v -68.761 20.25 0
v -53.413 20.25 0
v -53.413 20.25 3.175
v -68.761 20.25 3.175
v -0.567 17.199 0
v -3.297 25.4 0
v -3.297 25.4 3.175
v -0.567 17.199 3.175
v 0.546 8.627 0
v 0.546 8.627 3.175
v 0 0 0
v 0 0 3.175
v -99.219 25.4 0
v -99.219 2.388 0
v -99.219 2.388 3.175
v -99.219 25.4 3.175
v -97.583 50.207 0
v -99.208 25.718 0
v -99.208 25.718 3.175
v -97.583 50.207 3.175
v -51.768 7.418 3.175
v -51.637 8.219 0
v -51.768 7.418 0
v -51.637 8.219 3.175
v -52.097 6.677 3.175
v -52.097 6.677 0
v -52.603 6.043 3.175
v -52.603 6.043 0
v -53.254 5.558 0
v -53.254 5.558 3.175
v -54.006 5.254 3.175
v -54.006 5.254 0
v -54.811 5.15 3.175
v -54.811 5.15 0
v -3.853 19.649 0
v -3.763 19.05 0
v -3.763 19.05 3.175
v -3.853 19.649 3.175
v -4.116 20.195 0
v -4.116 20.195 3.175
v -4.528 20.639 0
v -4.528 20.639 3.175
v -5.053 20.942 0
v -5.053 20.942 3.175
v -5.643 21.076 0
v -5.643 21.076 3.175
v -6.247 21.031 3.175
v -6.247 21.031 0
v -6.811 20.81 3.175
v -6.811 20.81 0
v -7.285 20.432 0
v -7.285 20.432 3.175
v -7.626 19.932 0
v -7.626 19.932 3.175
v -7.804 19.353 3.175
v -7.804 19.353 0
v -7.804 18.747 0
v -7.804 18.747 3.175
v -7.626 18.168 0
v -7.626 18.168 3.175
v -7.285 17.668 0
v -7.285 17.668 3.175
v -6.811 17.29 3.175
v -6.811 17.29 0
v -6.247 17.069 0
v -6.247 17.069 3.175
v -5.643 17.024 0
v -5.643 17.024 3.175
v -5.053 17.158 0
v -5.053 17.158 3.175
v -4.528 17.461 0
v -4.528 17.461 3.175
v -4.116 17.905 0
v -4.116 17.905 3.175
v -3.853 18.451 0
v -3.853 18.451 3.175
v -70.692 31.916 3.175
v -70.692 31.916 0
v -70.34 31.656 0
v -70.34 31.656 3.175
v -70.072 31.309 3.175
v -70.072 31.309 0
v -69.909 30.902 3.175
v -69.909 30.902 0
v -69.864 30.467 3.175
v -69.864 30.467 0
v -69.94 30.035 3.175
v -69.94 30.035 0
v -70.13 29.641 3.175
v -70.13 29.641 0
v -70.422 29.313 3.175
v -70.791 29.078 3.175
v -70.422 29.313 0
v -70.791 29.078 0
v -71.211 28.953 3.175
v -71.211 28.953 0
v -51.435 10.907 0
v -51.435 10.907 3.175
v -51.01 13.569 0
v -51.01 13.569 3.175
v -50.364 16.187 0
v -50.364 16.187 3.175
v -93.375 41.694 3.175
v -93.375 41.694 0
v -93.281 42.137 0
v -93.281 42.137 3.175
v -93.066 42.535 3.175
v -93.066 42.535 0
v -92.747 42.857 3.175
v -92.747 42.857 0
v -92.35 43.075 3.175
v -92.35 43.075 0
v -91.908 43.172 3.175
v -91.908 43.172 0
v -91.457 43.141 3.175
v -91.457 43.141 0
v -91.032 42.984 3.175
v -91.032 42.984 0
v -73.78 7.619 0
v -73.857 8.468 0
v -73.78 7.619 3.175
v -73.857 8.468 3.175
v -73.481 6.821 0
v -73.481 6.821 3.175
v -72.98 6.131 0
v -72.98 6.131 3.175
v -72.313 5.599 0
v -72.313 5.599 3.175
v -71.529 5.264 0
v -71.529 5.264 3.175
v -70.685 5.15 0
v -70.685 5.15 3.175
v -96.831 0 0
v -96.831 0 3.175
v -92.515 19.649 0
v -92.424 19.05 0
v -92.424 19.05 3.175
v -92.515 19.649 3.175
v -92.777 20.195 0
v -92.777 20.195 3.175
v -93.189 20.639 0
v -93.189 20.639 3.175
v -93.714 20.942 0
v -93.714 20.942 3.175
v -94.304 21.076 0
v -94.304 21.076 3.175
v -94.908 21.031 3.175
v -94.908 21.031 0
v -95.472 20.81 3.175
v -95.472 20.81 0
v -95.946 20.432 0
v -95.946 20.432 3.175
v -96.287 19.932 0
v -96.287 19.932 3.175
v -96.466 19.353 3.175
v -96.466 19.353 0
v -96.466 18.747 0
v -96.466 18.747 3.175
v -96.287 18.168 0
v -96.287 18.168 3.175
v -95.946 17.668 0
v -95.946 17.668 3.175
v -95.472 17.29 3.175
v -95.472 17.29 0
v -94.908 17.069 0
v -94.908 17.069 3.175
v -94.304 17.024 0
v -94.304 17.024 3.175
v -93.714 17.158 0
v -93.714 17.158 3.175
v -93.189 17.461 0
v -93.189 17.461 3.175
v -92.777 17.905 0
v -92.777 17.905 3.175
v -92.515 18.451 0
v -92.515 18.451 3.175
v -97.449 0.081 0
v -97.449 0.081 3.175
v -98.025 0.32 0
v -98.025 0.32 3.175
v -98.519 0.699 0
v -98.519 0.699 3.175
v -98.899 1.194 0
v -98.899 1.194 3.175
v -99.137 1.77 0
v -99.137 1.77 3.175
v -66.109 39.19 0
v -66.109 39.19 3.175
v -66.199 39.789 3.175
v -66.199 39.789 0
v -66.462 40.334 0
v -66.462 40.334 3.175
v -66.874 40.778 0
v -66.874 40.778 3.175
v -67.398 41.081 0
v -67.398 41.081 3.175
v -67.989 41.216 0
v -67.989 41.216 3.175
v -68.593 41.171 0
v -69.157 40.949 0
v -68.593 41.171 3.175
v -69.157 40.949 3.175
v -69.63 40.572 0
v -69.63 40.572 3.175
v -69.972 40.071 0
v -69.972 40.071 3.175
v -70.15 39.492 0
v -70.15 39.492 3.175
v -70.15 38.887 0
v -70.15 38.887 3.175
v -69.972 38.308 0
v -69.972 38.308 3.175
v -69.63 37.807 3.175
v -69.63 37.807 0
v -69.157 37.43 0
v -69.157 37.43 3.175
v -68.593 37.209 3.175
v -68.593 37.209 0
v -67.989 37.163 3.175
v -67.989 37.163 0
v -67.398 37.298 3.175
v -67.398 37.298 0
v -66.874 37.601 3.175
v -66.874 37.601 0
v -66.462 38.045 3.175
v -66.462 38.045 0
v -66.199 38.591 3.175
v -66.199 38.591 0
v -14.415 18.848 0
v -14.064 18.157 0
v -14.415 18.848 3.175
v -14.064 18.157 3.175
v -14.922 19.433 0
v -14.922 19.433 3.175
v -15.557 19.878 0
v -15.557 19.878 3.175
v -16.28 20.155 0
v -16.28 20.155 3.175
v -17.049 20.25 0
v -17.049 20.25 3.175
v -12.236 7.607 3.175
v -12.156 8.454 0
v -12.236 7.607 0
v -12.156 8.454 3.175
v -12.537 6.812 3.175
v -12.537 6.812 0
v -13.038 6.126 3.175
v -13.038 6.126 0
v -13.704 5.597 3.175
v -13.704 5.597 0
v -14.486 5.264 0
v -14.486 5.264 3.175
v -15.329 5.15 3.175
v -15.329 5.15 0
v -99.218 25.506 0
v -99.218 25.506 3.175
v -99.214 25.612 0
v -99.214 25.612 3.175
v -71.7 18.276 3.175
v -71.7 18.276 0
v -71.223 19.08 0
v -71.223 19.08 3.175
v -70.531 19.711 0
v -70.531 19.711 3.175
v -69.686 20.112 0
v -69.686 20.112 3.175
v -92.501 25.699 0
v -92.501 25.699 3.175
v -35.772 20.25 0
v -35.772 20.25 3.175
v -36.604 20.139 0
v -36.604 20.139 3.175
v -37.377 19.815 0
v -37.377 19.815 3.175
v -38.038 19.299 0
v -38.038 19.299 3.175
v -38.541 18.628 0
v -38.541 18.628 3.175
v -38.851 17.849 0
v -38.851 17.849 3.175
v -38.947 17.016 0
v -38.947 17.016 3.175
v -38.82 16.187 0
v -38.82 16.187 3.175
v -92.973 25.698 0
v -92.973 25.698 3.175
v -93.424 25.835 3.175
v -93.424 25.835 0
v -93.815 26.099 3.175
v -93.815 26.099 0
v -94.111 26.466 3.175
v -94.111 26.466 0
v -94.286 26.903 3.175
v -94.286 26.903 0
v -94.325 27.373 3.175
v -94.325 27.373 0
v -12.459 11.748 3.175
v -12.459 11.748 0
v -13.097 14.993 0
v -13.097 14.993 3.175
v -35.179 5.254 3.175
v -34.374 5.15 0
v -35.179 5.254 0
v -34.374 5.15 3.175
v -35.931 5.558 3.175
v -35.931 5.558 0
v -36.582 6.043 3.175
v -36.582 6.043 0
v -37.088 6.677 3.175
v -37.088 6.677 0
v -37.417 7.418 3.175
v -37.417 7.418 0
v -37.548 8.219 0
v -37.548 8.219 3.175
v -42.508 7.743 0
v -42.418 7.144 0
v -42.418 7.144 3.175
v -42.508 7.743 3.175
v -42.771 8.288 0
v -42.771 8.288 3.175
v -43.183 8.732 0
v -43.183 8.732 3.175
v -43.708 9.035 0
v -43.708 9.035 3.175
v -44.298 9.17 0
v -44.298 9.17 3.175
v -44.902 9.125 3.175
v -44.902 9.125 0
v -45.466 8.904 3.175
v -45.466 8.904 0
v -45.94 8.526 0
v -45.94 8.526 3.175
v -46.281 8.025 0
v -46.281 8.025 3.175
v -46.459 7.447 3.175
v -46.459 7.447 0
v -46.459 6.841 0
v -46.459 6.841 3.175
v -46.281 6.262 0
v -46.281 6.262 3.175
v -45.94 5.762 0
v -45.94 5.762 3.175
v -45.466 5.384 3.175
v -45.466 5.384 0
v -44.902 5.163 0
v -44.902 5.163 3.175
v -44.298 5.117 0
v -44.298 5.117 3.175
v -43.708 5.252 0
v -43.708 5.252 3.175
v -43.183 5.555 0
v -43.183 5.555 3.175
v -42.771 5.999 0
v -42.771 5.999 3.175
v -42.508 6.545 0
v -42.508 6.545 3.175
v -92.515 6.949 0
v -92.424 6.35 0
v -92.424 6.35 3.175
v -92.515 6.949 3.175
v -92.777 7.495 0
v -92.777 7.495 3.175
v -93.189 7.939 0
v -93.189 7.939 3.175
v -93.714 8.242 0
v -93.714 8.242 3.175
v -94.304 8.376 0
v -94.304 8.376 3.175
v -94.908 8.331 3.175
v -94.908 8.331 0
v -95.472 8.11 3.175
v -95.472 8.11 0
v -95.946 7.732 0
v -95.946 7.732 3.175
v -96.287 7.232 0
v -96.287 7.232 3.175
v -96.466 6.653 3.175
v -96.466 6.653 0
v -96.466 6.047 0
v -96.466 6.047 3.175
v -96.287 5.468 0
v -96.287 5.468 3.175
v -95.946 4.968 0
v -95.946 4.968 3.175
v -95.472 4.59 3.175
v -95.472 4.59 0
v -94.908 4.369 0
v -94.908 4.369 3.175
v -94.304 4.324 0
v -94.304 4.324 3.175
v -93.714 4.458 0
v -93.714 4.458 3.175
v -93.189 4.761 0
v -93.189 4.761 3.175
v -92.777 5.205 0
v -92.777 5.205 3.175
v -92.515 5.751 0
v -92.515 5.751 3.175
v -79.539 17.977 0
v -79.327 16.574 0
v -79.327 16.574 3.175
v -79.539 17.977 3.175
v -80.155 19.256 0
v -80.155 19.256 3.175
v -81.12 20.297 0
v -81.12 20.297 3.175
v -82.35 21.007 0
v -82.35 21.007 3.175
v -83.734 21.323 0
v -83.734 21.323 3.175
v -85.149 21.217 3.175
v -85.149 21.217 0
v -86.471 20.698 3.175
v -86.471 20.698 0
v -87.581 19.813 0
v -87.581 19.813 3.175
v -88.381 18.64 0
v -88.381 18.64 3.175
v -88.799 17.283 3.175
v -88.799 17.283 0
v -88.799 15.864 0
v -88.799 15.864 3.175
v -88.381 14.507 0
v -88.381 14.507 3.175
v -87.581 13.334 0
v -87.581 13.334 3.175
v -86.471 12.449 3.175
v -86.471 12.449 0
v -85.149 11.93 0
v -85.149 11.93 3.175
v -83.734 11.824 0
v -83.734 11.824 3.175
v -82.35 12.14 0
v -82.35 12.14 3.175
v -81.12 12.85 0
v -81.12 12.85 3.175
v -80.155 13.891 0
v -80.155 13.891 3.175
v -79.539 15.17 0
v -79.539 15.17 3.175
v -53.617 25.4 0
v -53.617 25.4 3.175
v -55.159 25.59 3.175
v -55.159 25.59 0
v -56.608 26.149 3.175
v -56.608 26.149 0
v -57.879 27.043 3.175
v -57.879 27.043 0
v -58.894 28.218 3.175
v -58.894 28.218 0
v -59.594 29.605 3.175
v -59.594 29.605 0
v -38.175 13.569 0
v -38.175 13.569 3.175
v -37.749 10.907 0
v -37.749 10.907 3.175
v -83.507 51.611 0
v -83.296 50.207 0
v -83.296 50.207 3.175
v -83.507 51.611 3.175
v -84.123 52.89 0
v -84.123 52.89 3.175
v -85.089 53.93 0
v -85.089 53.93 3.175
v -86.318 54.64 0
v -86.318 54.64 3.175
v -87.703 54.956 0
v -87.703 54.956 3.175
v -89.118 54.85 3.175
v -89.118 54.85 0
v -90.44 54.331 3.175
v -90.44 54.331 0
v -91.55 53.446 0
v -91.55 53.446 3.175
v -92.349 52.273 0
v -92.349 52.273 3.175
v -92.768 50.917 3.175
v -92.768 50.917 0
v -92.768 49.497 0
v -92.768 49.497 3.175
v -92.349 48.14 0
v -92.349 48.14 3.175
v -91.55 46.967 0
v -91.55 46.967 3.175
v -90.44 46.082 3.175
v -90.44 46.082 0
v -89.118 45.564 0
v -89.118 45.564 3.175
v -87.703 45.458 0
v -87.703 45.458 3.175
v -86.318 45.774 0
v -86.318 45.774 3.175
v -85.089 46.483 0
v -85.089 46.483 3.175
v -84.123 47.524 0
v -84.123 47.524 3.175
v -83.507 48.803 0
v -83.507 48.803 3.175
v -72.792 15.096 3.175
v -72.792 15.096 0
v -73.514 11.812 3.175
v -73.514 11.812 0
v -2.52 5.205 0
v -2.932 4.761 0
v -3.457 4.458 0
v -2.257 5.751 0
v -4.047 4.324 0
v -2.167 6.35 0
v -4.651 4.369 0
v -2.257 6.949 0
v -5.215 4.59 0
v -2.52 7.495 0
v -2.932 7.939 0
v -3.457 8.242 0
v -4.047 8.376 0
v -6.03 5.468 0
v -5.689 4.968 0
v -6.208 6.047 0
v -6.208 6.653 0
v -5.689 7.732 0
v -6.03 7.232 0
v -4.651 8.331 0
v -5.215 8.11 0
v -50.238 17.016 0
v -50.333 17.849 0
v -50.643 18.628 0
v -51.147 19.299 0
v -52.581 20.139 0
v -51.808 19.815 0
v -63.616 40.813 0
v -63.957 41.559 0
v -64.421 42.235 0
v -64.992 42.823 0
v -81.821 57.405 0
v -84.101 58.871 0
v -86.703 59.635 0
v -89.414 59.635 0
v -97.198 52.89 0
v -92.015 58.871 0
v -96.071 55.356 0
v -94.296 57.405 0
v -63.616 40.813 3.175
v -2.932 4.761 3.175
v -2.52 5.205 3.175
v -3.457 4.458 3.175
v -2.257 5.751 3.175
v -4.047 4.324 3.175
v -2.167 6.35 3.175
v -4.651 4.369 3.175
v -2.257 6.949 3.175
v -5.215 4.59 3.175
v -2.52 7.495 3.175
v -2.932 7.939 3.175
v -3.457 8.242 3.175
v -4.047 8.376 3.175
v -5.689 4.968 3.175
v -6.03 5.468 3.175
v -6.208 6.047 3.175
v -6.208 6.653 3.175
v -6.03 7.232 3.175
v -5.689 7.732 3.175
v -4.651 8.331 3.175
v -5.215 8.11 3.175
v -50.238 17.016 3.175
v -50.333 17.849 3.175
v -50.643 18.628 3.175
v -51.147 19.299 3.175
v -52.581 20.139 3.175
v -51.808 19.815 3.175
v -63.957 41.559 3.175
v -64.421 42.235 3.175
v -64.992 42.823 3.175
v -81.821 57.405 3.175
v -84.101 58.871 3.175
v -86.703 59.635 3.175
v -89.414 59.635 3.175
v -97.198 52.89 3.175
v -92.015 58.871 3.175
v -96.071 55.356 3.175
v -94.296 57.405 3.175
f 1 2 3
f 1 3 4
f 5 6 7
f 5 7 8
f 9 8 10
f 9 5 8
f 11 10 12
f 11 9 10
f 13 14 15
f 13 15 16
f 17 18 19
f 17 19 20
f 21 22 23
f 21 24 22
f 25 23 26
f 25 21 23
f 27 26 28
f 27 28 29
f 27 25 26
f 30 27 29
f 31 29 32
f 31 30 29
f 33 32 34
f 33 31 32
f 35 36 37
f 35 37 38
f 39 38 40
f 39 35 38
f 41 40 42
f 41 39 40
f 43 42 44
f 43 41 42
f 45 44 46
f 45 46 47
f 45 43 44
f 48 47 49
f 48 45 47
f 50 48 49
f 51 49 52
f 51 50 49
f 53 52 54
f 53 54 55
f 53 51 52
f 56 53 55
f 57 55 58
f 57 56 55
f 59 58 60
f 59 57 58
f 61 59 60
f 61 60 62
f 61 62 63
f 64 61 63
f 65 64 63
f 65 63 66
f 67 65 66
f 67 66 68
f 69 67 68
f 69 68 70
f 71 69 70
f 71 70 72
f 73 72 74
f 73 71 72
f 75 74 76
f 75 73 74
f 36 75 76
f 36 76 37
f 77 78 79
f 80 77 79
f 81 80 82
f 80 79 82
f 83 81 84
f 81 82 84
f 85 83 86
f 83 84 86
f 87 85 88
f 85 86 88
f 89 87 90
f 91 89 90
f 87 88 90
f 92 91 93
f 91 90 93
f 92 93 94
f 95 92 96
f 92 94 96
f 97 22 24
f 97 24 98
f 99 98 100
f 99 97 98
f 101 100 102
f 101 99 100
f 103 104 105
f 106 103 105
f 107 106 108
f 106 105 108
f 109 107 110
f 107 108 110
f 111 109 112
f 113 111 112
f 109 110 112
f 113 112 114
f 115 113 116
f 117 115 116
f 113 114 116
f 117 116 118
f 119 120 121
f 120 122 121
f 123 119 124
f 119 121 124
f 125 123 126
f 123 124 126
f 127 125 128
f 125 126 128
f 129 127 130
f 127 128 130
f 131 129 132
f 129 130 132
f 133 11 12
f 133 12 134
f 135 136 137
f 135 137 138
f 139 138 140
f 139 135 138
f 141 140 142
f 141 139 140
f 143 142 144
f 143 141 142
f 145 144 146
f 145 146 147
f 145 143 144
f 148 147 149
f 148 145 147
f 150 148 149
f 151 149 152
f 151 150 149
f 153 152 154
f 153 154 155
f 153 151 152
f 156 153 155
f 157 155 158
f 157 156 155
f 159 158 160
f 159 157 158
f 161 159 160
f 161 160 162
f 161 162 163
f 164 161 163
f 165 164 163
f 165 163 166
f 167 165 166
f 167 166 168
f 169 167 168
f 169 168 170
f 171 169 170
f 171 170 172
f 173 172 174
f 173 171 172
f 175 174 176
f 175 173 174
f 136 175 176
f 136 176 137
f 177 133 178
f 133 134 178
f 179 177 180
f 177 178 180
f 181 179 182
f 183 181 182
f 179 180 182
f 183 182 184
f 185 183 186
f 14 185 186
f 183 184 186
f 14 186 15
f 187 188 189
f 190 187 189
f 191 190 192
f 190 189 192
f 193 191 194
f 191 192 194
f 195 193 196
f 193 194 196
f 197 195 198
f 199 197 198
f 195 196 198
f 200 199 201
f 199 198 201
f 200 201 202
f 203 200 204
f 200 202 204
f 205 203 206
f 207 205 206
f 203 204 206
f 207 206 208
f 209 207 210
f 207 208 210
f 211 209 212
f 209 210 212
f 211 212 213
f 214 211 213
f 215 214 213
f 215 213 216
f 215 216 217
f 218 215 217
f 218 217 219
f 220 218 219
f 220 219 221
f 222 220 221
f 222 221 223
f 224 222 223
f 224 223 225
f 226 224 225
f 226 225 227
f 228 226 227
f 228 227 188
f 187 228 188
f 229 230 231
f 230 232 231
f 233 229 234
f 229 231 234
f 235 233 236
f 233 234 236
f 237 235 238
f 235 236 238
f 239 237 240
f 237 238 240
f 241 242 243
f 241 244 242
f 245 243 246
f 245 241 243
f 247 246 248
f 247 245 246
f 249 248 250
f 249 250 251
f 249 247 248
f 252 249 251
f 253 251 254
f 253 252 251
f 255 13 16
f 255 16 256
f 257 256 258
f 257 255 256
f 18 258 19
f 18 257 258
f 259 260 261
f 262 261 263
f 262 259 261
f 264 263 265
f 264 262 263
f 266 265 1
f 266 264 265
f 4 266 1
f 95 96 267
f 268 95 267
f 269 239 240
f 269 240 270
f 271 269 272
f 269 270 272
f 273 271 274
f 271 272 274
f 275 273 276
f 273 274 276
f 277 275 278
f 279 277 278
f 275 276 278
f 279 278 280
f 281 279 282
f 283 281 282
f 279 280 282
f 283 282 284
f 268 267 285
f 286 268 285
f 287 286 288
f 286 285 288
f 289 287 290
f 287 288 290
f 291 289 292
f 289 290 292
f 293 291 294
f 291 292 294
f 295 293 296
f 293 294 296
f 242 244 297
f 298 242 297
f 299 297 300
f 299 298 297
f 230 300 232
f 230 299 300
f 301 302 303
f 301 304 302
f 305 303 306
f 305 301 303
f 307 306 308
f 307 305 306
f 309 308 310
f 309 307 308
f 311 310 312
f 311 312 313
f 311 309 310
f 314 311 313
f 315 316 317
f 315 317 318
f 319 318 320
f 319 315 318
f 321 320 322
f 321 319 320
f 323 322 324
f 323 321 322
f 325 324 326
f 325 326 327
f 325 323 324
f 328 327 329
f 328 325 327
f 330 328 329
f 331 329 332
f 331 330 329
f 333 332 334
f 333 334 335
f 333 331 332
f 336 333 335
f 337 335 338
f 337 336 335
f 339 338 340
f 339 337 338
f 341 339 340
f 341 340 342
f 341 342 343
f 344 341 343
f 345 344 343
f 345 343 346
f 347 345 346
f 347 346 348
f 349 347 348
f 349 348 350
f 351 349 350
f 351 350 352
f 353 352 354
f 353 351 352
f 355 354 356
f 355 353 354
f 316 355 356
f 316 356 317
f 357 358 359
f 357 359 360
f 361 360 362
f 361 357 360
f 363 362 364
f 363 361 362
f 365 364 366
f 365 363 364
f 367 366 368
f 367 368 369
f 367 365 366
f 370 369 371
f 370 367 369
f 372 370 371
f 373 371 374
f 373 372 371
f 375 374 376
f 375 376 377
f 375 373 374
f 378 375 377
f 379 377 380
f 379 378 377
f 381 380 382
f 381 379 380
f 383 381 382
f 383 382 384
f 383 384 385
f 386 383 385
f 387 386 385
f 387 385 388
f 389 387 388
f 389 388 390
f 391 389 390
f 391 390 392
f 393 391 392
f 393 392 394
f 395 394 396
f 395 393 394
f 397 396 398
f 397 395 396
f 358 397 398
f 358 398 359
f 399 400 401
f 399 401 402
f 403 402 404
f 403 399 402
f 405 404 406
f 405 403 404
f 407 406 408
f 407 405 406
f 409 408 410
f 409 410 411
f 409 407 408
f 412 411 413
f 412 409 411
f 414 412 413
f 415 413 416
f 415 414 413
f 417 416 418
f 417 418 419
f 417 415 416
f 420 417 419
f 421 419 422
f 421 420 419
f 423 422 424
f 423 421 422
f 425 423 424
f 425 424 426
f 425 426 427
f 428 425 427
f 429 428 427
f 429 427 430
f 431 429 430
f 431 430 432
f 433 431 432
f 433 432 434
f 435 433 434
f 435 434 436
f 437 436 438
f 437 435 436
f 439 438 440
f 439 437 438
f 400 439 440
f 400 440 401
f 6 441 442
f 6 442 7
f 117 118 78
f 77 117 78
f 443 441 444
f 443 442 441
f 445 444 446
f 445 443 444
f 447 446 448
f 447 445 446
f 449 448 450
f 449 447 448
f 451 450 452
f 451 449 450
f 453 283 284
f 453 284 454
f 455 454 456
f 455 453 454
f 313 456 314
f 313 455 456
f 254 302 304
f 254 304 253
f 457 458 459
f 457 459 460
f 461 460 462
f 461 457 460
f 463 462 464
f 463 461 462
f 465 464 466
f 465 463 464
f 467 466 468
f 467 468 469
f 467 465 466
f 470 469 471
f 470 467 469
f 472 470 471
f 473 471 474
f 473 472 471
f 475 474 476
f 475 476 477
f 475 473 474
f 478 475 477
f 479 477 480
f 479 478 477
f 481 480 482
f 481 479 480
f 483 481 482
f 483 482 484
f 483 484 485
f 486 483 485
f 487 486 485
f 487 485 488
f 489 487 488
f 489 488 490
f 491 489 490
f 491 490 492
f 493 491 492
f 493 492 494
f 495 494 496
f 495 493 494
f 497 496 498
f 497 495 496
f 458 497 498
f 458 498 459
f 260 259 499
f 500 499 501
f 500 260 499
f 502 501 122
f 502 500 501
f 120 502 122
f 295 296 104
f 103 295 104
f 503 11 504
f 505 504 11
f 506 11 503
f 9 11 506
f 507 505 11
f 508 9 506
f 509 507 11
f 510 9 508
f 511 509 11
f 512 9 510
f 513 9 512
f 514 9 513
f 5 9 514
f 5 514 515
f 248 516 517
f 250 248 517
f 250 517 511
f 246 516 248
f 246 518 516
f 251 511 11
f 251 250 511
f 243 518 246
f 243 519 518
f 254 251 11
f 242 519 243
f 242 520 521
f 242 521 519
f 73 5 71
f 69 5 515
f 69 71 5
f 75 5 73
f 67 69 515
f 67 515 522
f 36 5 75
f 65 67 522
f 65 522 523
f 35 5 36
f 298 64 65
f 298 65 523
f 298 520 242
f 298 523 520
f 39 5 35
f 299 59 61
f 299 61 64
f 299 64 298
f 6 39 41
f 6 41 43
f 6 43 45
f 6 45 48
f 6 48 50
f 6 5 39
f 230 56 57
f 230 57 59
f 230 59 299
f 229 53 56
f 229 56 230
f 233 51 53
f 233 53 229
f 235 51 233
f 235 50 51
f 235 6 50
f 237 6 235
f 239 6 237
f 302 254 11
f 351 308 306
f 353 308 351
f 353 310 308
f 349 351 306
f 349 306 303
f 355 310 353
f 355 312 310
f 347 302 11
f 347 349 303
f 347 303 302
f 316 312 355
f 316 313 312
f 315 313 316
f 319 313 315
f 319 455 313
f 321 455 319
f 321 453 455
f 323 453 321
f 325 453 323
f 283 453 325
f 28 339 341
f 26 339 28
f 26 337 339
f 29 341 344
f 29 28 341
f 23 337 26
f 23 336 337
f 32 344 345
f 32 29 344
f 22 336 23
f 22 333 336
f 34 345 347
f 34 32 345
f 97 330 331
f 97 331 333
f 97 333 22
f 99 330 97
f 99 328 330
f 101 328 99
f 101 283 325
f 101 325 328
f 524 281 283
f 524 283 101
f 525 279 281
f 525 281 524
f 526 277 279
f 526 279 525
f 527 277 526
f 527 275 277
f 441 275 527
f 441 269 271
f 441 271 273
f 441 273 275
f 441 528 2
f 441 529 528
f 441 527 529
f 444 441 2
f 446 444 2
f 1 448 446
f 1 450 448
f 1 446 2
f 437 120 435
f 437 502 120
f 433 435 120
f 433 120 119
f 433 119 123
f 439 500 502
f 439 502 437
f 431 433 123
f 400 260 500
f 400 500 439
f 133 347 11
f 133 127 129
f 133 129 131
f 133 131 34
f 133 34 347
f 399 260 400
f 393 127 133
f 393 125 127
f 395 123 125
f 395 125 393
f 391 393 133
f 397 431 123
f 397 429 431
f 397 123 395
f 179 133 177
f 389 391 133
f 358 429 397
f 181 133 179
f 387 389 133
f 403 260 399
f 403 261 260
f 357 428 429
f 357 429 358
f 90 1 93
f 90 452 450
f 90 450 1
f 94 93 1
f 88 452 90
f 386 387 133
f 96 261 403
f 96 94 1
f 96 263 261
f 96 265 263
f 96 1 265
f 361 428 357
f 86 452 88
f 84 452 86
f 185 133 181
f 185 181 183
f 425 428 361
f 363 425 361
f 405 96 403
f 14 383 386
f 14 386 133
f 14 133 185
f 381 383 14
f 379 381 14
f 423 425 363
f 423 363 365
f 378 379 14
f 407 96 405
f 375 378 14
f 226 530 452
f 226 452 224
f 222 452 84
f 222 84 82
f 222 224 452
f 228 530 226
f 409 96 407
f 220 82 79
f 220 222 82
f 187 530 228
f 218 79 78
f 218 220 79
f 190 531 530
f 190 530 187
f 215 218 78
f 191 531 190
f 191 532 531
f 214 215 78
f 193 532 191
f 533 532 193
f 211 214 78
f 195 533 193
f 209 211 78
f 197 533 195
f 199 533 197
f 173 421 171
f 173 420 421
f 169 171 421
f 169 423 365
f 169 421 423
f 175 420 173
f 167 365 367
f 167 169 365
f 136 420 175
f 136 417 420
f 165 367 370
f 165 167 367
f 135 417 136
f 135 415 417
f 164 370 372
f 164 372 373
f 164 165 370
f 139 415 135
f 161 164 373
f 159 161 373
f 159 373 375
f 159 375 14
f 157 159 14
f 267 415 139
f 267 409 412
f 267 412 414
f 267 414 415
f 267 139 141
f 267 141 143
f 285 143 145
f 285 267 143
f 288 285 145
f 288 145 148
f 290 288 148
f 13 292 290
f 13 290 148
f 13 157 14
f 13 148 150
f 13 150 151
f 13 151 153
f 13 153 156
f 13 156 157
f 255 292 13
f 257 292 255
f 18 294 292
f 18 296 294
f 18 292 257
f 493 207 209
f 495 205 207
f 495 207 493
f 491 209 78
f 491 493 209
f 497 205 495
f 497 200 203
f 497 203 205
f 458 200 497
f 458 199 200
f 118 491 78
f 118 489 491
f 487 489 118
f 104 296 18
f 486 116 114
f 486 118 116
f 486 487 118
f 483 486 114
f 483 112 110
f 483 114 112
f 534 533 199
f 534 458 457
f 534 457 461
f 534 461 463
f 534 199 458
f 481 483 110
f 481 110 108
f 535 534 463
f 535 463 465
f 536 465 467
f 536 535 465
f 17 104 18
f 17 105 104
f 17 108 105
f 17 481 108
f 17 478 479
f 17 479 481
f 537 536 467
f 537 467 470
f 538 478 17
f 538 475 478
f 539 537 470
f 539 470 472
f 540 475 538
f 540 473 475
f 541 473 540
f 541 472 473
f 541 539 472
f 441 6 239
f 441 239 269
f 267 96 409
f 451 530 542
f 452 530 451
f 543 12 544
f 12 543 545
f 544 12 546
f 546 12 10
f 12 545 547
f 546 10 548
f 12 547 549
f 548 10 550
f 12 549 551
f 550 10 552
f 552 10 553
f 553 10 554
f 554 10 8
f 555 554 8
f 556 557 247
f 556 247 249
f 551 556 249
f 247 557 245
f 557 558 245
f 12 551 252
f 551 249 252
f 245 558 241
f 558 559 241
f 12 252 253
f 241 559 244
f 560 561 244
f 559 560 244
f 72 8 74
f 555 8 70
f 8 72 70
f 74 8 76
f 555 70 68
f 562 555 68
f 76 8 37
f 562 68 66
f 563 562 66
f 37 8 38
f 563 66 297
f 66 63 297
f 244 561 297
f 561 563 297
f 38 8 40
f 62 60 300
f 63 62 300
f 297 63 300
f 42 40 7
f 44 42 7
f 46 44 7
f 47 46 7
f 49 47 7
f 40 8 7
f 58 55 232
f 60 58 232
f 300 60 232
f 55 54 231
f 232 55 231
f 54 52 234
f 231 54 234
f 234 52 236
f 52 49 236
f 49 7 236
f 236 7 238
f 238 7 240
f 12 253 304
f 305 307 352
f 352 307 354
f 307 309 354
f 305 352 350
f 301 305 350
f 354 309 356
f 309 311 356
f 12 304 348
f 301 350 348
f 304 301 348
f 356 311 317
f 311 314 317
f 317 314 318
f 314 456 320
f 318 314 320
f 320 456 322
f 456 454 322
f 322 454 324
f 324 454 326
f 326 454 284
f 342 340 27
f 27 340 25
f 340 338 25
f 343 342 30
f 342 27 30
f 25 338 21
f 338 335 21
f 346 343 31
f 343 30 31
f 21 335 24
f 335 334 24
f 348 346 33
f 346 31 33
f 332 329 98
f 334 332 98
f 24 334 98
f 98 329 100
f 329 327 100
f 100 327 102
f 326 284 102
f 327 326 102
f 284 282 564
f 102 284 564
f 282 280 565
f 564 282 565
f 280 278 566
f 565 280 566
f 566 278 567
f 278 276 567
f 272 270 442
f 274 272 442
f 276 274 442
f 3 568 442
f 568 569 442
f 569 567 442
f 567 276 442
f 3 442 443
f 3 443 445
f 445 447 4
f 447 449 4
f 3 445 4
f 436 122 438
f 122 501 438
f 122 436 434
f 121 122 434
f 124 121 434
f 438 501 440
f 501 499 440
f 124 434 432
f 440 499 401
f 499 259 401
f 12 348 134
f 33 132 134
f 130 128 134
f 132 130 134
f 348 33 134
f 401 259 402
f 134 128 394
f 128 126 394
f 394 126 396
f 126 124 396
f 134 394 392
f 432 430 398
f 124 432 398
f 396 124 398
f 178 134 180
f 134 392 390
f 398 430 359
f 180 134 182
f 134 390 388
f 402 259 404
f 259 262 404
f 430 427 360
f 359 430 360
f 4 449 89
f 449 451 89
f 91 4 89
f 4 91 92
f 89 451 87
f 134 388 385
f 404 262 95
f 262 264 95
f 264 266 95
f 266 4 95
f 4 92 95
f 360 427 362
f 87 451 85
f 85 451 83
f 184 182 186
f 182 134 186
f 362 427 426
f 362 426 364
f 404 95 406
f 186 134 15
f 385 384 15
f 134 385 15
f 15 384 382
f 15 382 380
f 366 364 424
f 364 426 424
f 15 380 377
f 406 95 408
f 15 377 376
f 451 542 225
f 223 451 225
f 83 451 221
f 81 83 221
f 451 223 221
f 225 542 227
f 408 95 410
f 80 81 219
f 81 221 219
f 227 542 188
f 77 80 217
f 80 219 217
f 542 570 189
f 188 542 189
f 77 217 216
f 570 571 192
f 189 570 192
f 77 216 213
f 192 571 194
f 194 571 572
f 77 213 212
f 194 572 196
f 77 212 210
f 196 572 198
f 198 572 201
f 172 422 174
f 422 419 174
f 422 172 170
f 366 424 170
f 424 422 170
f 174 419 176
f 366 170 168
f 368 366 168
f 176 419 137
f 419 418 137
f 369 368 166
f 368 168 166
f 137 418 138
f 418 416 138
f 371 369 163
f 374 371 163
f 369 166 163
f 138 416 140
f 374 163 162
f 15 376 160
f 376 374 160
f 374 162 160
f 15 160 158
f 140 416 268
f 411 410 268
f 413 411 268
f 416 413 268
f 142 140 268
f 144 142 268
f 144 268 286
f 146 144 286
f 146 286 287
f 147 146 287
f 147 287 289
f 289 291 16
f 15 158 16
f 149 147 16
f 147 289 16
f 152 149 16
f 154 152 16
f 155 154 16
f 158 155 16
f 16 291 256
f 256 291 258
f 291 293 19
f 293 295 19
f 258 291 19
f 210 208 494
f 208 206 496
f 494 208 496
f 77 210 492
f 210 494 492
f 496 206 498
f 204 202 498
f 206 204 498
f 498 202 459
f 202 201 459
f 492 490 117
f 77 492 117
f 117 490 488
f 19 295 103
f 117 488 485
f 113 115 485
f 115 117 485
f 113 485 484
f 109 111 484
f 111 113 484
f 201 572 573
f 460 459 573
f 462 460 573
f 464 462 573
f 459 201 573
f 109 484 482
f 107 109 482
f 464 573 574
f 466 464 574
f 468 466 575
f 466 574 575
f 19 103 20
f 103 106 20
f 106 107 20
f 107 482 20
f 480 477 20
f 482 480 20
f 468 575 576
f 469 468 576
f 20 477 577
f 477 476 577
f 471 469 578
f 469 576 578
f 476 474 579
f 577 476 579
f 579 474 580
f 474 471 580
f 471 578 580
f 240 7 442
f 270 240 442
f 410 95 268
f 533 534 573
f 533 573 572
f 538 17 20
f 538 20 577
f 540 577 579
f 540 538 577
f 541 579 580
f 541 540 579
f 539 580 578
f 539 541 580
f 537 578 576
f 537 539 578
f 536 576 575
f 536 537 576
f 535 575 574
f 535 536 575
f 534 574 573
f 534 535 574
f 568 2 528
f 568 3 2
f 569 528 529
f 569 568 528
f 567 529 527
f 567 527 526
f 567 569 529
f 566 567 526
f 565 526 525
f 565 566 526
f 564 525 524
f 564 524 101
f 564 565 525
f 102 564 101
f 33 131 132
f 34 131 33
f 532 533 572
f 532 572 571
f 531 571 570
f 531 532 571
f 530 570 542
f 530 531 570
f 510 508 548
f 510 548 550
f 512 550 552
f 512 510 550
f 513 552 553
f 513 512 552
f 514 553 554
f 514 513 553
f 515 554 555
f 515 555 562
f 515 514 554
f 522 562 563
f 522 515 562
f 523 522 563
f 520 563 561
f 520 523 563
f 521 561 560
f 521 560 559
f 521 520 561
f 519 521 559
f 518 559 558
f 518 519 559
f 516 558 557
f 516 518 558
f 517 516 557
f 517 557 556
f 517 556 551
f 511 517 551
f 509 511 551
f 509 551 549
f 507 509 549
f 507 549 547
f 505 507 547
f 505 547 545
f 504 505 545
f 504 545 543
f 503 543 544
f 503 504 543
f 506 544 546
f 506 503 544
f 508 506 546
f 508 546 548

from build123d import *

# Parameters (mm, degrees)
SKETCH1_R           = 2.032
SKETCH1_R_2         = 4.7625
BOSS_EXTRUDE1_DEPTH = 3.175
FILLET1_R           = 6.35
SKETCH2_R           = 2.032
CUT_EXTRUDE1_DEPTH  = 116.854784776
FILLET2_R           = 2.3876
CUT_EXTRUDE2_REACH  = 117.855
FILLET3_R           = 3.175


with BuildPart() as part:
    # Sketch1 → Boss-Extrude1 (new body)
    with BuildSketch(Plane.XY):
        with BuildLine():
            Line((0, 0), (-99.21875, 0))
            Line((-99.21875, 0), (-99.21875, 25.4))
            ThreePointArc((-99.21875, 25.4), (-99.216112514, 25.559225204), (-99.208202949, 25.718275702))
            Line((-99.208202949, 25.718275702), (-97.583411312, 50.206818816))
            ThreePointArc((-97.583411312, 50.206818816), (-92.015151864, 58.871103506), (-81.820717516, 57.405207601))
            Line((-81.820717516, 57.405207601), (-64.992407125, 42.82279889))
            ThreePointArc((-64.992407125, 42.82279889), (-64.174703888, 41.906719209), (-63.615743119, 40.813374148))
            Line((-63.615743119, 40.813374148), (-58.084627995, 25.4))
            Line((-58.084627995, 25.4), (-3.297296565, 25.4))
            ThreePointArc((-3.297296565, 25.4), (0.195780415, 12.939434189), (0, 0))
        make_face()
        with Locations((-44.45, 7.14375)):
            Circle(SKETCH1_R, mode=Mode.SUBTRACT)
        with Locations((-84.089661312, 16.5735)):
            Circle(SKETCH1_R_2, mode=Mode.SUBTRACT)
        with Locations((-88.058411312, 50.206818816)):
            Circle(SKETCH1_R_2, mode=Mode.SUBTRACT)
        with Locations((-4.19910616, 6.35)):
            Circle(SKETCH1_R, mode=Mode.SUBTRACT)
        with Locations((-5.795027999, 19.05)):
            Circle(SKETCH1_R, mode=Mode.SUBTRACT)
        with Locations((-94.45625, 6.35)):
            Circle(SKETCH1_R, mode=Mode.SUBTRACT)
        with Locations((-94.45625, 19.05)):
            Circle(SKETCH1_R, mode=Mode.SUBTRACT)
    extrude(amount=BOSS_EXTRUDE1_DEPTH)

    # Fillet1
    fillet1_edges = [part.edges().sort_by_distance(p)[0] for p in [
        (-58.084627995, 25.4, 1.5875),
    ]]
    fillet(fillet1_edges, radius=FILLET1_R)

    # Sketch2 → Cut-Extrude1 (cut, through all)
    with BuildSketch(Plane.XY.offset(3.175)):
        with Locations((-68.140747312, 39.189568816)):
            Circle(SKETCH2_R)
    extrude(amount=-CUT_EXTRUDE1_DEPTH, mode=Mode.SUBTRACT)

    # Fillet2
    fillet2_edges = [part.edges().sort_by_distance(p)[0] for p in [
        (-99.21875, 0, 1.5875),
    ]]
    fillet(fillet2_edges, radius=FILLET2_R)

    # Sketch4 → Cut-Extrude2 (cut, up to next)
    with BuildSketch(Plane(origin=(0, 0, 0), x_dir=(-1, 0, 0), z_dir=(0, 0, -1)), mode=Mode.PRIVATE) as cut_extrude2_sk1:
        with BuildLine():
            Line((14.906243411, 20.25001426), (40.306243411, 20.25001426))
            ThreePointArc((40.306243411, 20.25001426), (38.03973616, 12.863437985), (37.591162137, 5.14998574))
            Line((37.591162137, 5.14998574), (12.191162137, 5.14998574))
            ThreePointArc((12.191162137, 5.14998574), (12.63973616, 12.863437985), (14.906243411, 20.25001426))
        make_face()
    cut_extrude2_tool1 = extrude(cut_extrude2_sk1.sketch, amount=-CUT_EXTRUDE2_REACH, mode=Mode.PRIVATE) & part.part
    # Sketch4 → Cut-Extrude2 (cut, up to next)
    with BuildSketch(Plane(origin=(0, 0, 0), x_dir=(-1, 0, 0), z_dir=(0, 0, -1)), mode=Mode.PRIVATE) as cut_extrude2_sk2:
        with BuildLine():
            Line((71.210862075, 28.952720027), (92.501475834, 25.698758848))
            ThreePointArc((92.501475834, 25.698758848), (93.814902604, 26.098604816), (94.325334391, 27.37313456))
            Line((94.325334391, 27.37313456), (93.375138804, 41.6942974))
            ThreePointArc((93.375138804, 41.6942974), (92.556554604, 42.979979171), (91.032400998, 42.983652428))
            Line((91.032400998, 42.983652428), (70.691982826, 31.916450766))
            ThreePointArc((70.691982826, 31.916450766), (69.886987798, 30.248228031), (71.210862075, 28.952720027))
        make_face()
    cut_extrude2_tool2 = extrude(cut_extrude2_sk2.sketch, amount=-CUT_EXTRUDE2_REACH, mode=Mode.PRIVATE) & part.part
    # Sketch4 → Cut-Extrude2 (cut, up to next)
    with BuildSketch(Plane(origin=(0, 0, 0), x_dir=(-1, 0, 0), z_dir=(0, 0, -1)), mode=Mode.PRIVATE) as cut_extrude2_sk3:
        with BuildLine():
            Line((73.81875, 5.14998574), (51.59375, 5.14998574))
            ThreePointArc((51.59375, 5.14998574), (51.145175977, 12.863437985), (48.878668725, 20.25001426))
            Line((48.878668725, 20.25001426), (70.807625266, 20.25001426))
            ThreePointArc((70.807625266, 20.25001426), (73.317974303, 12.900366376), (73.81875, 5.14998574))
        make_face()
    cut_extrude2_tool3 = extrude(cut_extrude2_sk3.sketch, amount=-CUT_EXTRUDE2_REACH, mode=Mode.PRIVATE) & part.part
    add(cut_extrude2_tool1.solids().sort_by_distance((-25.621324, 12.7, 0))[0], mode=Mode.SUBTRACT)
    add(cut_extrude2_tool2.solids().sort_by_distance((-84.934877, 33.097306, 0))[0], mode=Mode.SUBTRACT)
    add(cut_extrude2_tool3.solids().sort_by_distance((-61.941303, 12.68386, 0))[0], mode=Mode.SUBTRACT)

    # Fillet3
    fillet3_edges = [part.edges().sort_by_distance(p)[0] for p in [
        (-70.807625266, 20.25001426, 1.5875),
        (-73.81875, 5.14998574, 1.5875),
        (-51.59375, 5.14998574, 1.5875),
        (-48.878668725, 20.25001426, 1.5875),
        (-40.306243411, 20.25001426, 1.5875),
        (-37.591162137, 5.14998574, 1.5875),
        (-12.191162137, 5.14998574, 1.5875),
        (-14.906243411, 20.25001426, 1.5875),
    ]]
    fillet(fillet3_edges, radius=FILLET3_R)


solid = part.part
